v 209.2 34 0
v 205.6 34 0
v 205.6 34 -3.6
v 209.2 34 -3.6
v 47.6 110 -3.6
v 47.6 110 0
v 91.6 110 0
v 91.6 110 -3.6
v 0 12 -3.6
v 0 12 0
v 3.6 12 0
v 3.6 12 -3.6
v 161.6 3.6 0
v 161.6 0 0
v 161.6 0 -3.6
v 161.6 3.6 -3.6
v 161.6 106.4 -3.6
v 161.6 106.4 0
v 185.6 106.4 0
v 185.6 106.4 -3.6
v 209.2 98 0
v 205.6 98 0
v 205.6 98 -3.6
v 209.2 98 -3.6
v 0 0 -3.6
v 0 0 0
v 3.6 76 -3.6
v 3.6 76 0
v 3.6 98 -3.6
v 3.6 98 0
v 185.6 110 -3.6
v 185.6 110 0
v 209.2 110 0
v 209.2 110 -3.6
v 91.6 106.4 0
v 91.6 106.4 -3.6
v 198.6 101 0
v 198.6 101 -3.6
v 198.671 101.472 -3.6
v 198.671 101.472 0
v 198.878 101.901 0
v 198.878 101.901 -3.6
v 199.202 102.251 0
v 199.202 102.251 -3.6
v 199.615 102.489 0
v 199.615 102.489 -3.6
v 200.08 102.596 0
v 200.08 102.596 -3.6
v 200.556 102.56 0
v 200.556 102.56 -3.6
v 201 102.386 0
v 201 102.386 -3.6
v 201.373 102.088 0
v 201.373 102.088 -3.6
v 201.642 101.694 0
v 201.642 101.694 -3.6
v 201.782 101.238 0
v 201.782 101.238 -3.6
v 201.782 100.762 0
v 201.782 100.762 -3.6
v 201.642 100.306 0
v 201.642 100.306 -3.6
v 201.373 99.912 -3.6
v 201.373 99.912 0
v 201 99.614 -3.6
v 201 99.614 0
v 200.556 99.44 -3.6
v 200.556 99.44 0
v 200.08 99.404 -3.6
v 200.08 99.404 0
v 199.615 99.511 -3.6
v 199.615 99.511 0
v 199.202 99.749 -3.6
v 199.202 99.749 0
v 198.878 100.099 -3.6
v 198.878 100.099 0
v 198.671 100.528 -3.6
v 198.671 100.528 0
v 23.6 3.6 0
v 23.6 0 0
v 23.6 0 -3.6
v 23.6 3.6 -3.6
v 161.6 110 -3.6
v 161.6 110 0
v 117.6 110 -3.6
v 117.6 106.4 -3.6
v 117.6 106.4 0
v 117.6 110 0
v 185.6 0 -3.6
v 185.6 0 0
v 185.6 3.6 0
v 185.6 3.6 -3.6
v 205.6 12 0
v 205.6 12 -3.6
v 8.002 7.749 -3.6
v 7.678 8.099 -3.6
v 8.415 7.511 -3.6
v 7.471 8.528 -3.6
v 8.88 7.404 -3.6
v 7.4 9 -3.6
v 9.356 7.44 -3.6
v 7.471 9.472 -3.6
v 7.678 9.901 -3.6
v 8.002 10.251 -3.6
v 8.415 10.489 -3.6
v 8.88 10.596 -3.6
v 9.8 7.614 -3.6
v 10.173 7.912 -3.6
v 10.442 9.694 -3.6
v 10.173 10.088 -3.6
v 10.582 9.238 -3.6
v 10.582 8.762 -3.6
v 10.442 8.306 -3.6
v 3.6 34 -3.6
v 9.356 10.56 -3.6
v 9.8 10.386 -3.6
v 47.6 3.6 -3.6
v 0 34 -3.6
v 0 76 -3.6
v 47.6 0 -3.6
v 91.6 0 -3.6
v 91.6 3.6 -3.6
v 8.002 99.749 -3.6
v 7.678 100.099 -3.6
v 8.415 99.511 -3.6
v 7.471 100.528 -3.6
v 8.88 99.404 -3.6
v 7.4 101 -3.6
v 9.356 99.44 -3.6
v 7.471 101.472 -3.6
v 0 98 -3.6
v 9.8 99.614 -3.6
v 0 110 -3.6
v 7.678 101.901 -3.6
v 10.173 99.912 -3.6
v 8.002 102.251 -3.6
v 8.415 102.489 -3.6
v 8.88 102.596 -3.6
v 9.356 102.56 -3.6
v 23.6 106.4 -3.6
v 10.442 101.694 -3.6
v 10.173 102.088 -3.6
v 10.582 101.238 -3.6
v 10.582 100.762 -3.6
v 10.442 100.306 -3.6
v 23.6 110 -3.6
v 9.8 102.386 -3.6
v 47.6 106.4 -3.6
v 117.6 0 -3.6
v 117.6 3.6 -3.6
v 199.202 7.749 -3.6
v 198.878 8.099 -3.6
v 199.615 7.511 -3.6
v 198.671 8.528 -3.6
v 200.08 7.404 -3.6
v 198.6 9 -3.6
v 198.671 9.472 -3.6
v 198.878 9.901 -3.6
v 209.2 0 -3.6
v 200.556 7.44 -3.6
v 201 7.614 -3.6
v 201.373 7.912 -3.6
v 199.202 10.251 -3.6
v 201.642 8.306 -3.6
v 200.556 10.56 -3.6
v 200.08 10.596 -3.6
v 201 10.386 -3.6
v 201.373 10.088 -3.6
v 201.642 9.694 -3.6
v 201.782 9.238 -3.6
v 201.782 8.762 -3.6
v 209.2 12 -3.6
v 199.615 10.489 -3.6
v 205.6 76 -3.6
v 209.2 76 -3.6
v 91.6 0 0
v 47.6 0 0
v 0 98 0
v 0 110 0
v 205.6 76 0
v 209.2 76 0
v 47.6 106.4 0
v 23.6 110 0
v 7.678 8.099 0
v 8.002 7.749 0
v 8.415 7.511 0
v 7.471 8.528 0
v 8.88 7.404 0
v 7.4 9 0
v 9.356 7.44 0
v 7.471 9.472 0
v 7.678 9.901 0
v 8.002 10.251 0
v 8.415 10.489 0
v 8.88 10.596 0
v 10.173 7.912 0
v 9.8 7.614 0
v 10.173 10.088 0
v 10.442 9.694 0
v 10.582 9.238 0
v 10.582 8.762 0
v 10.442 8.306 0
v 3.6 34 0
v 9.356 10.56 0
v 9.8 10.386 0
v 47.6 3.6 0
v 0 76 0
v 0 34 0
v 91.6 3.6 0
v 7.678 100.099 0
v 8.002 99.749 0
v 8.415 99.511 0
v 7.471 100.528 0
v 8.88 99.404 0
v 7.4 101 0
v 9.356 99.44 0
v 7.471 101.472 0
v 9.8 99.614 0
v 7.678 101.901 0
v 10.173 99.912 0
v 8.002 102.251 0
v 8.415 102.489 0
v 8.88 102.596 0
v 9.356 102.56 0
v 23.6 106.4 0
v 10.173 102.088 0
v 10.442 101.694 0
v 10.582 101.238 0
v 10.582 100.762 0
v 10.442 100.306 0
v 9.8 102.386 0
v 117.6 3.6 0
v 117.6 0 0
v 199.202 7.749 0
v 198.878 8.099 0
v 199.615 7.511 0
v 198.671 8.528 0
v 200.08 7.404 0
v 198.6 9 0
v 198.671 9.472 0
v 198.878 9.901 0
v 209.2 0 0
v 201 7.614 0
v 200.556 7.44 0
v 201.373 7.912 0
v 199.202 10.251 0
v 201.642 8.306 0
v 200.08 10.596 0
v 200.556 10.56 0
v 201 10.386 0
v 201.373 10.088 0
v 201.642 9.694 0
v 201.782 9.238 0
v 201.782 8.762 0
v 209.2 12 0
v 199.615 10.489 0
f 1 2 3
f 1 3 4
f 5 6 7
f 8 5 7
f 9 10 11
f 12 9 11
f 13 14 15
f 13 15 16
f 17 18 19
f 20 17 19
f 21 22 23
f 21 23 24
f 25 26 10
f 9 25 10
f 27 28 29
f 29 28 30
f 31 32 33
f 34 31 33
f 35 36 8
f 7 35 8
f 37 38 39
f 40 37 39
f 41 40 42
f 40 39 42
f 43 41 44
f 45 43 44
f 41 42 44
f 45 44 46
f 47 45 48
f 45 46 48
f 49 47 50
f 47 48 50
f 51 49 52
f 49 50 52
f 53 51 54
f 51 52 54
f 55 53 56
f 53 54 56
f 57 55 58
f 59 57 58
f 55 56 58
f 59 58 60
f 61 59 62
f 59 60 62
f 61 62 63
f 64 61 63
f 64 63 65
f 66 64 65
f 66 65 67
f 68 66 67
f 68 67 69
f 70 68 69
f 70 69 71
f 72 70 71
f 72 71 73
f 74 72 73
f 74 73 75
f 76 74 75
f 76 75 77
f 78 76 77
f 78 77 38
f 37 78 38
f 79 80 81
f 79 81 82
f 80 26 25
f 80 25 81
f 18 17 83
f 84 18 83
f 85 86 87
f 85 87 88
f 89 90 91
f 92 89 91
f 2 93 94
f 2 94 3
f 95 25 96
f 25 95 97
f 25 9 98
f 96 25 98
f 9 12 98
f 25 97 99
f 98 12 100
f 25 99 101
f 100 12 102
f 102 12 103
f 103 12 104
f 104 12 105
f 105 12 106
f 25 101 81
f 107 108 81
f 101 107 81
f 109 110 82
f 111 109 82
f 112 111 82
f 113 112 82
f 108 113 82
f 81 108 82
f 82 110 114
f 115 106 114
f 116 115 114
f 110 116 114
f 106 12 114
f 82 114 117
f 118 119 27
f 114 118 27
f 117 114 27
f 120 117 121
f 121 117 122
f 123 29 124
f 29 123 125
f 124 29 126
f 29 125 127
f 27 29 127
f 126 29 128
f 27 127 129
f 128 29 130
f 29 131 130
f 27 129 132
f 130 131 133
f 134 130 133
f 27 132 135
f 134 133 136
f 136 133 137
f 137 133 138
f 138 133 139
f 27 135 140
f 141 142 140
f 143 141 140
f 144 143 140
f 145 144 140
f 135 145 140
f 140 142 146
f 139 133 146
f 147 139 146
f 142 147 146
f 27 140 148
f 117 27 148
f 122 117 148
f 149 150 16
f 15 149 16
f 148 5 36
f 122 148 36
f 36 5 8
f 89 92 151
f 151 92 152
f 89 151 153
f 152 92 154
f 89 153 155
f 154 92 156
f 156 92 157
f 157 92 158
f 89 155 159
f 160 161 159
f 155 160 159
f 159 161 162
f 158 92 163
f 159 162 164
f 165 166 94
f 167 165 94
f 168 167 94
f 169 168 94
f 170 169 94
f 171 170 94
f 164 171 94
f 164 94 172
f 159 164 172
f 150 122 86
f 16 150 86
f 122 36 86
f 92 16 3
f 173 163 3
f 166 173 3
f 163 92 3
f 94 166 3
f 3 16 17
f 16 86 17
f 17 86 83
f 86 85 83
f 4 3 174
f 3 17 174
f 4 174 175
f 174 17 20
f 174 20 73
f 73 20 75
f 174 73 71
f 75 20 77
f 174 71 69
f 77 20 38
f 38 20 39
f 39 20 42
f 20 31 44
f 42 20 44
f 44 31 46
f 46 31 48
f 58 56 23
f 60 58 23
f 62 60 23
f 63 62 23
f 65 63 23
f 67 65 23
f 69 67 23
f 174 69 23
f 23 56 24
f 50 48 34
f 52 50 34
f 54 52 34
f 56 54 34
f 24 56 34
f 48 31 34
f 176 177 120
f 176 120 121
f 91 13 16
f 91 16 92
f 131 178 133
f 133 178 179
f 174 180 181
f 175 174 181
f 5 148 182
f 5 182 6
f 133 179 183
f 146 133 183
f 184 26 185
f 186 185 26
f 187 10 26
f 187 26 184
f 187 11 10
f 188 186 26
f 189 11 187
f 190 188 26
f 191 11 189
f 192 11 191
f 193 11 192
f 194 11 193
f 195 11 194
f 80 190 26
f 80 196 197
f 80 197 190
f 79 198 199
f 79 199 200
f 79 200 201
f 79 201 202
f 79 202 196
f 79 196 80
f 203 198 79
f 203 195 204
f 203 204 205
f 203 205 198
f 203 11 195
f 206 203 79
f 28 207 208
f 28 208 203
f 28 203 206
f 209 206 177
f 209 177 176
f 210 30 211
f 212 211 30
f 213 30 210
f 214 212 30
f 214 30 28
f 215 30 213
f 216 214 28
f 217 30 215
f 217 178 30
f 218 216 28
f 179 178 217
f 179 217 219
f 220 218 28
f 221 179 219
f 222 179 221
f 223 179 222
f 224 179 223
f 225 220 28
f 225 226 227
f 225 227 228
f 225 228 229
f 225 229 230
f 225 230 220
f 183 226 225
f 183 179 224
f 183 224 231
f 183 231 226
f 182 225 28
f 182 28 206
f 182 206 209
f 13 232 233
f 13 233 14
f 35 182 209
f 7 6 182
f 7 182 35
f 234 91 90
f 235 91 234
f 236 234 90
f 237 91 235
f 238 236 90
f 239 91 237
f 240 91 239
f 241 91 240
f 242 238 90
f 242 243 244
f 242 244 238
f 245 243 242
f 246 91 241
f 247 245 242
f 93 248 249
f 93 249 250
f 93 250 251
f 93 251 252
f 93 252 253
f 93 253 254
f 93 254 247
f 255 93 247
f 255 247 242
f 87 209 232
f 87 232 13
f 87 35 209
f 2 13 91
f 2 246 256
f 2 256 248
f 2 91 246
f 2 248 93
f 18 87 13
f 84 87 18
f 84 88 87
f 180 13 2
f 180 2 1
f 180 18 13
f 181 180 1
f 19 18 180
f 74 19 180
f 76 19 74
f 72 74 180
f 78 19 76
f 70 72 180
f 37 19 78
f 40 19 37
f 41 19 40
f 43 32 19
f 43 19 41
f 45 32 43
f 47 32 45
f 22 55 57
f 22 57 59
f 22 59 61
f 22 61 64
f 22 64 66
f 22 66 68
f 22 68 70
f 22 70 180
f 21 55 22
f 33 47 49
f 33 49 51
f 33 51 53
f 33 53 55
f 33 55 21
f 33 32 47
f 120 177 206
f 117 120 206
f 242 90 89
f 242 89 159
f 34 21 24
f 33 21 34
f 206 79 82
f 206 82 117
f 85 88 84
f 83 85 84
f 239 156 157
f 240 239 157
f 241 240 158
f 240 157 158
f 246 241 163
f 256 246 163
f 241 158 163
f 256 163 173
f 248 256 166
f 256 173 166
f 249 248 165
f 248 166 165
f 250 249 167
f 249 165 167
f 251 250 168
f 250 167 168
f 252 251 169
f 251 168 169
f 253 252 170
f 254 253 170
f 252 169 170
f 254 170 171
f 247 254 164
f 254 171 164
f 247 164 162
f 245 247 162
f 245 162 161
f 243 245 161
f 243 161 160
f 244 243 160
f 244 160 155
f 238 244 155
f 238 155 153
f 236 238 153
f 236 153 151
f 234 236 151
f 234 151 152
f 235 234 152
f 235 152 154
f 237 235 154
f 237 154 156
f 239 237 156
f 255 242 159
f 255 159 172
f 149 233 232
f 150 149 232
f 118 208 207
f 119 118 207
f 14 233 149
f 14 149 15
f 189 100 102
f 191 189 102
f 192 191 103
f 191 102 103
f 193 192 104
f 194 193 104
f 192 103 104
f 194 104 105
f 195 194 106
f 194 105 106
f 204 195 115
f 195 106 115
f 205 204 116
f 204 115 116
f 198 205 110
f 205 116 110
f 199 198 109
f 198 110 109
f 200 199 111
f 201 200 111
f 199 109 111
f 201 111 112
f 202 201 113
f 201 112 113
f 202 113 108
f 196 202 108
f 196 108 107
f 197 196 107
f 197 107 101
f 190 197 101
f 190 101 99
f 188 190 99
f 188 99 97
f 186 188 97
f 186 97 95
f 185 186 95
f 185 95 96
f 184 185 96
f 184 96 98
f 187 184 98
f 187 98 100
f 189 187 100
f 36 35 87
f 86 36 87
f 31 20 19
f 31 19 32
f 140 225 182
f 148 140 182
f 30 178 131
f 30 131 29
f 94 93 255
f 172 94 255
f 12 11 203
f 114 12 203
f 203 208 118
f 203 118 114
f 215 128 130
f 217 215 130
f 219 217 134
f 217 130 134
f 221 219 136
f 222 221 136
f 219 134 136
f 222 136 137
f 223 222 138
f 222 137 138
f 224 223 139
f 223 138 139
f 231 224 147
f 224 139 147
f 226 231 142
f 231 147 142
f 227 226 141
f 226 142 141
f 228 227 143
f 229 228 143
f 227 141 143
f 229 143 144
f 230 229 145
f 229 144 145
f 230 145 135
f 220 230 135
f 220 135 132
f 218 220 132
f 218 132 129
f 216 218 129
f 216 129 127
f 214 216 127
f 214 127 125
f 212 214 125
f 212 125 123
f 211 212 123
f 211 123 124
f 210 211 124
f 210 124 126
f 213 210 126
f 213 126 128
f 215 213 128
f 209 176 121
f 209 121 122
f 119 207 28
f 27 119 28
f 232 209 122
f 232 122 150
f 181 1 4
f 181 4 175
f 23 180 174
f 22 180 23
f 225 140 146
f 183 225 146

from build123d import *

# Parameters (mm, degrees)
SKETCH_1_W             = 209.2
SKETCH_1_H             = 110
SM_BASE_FLANGE_1_DEPTH = 3.6
CUT_EXTRUDE_1_REACH    = 238.384
SKETCH_2_W             = 3.6
SKETCH_2_H             = 22
SKETCH_2_W_2           = 24
SKETCH_2_H_2           = 3.6
SKETCH_2_W_3           = 26
CUT_EXTRUDE_2_REACH    = 238.384
SKETCH_3_R             = 1.6


# Sheet-metal steps are written as plain solids
with BuildPart() as part:
    # Sketch 1 → Базовая кромка1 (new body)
    with BuildSketch(Plane.XY):
        with Locations((104.6, 55)):
            Rectangle(SKETCH_1_W, SKETCH_1_H)
    extrude(amount=-SM_BASE_FLANGE_1_DEPTH)

    # Sketch 2 → Вырез-Вытянуть1 (cut, up to next)
    with BuildSketch(Plane.XY, mode=Mode.PRIVATE) as cut_extrude_1_sk1:
        with Locations((1.8, 23)):
            Rectangle(SKETCH_2_W, SKETCH_2_H)
    cut_extrude_1_tool1 = extrude(cut_extrude_1_sk1.sketch, amount=-CUT_EXTRUDE_1_REACH, mode=Mode.PRIVATE) & part.part
    # Sketch 2 → Вырез-Вытянуть1 (cut, up to next)
    with BuildSketch(Plane.XY, mode=Mode.PRIVATE) as cut_extrude_1_sk2:
        with Locations((35.6, 1.8)):
            Rectangle(SKETCH_2_W_2, SKETCH_2_H_2)
    cut_extrude_1_tool2 = extrude(cut_extrude_1_sk2.sketch, amount=-CUT_EXTRUDE_1_REACH, mode=Mode.PRIVATE) & part.part
    # Sketch 2 → Вырез-Вытянуть1 (cut, up to next)
    with BuildSketch(Plane.XY, mode=Mode.PRIVATE) as cut_extrude_1_sk3:
        with Locations((207.4, 87)):
            Rectangle(SKETCH_2_W, SKETCH_2_H)
    cut_extrude_1_tool3 = extrude(cut_extrude_1_sk3.sketch, amount=-CUT_EXTRUDE_1_REACH, mode=Mode.PRIVATE) & part.part
    # Sketch 2 → Вырез-Вытянуть1 (cut, up to next)
    with BuildSketch(Plane.XY, mode=Mode.PRIVATE) as cut_extrude_1_sk4:
        with Locations((104.6, 1.8)):
            Rectangle(SKETCH_2_W_3, SKETCH_2_H_2)
    cut_extrude_1_tool4 = extrude(cut_extrude_1_sk4.sketch, amount=-CUT_EXTRUDE_1_REACH, mode=Mode.PRIVATE) & part.part
    # Sketch 2 → Вырез-Вытянуть1 (cut, up to next)
    with BuildSketch(Plane.XY, mode=Mode.PRIVATE) as cut_extrude_1_sk5:
        with Locations((173.6, 1.8)):
            Rectangle(SKETCH_2_W_2, SKETCH_2_H_2)
    cut_extrude_1_tool5 = extrude(cut_extrude_1_sk5.sketch, amount=-CUT_EXTRUDE_1_REACH, mode=Mode.PRIVATE) & part.part
    # Sketch 2 → Вырез-Вытянуть1 (cut, up to next)
    with BuildSketch(Plane.XY, mode=Mode.PRIVATE) as cut_extrude_1_sk6:
        with Locations((207.4, 23)):
            Rectangle(SKETCH_2_W, SKETCH_2_H)
    cut_extrude_1_tool6 = extrude(cut_extrude_1_sk6.sketch, amount=-CUT_EXTRUDE_1_REACH, mode=Mode.PRIVATE) & part.part
    # Sketch 2 → Вырез-Вытянуть1 (cut, up to next)
    with BuildSketch(Plane.XY, mode=Mode.PRIVATE) as cut_extrude_1_sk7:
        with Locations((173.6, 108.2)):
            Rectangle(SKETCH_2_W_2, SKETCH_2_H_2)
    cut_extrude_1_tool7 = extrude(cut_extrude_1_sk7.sketch, amount=-CUT_EXTRUDE_1_REACH, mode=Mode.PRIVATE) & part.part
    # Sketch 2 → Вырез-Вытянуть1 (cut, up to next)
    with BuildSketch(Plane.XY, mode=Mode.PRIVATE) as cut_extrude_1_sk8:
        with Locations((104.6, 108.2)):
            Rectangle(SKETCH_2_W_3, SKETCH_2_H_2)
    cut_extrude_1_tool8 = extrude(cut_extrude_1_sk8.sketch, amount=-CUT_EXTRUDE_1_REACH, mode=Mode.PRIVATE) & part.part
    # Sketch 2 → Вырез-Вытянуть1 (cut, up to next)
    with BuildSketch(Plane.XY, mode=Mode.PRIVATE) as cut_extrude_1_sk9:
        with Locations((35.6, 108.2)):
            Rectangle(SKETCH_2_W_2, SKETCH_2_H_2)
    cut_extrude_1_tool9 = extrude(cut_extrude_1_sk9.sketch, amount=-CUT_EXTRUDE_1_REACH, mode=Mode.PRIVATE) & part.part
    # Sketch 2 → Вырез-Вытянуть1 (cut, up to next)
    with BuildSketch(Plane.XY, mode=Mode.PRIVATE) as cut_extrude_1_sk10:
        with Locations((1.8, 87)):
            Rectangle(SKETCH_2_W, SKETCH_2_H)
    cut_extrude_1_tool10 = extrude(cut_extrude_1_sk10.sketch, amount=-CUT_EXTRUDE_1_REACH, mode=Mode.PRIVATE) & part.part
    add(cut_extrude_1_tool1.solids().sort_by_distance((1.8, 23, 0))[0], mode=Mode.SUBTRACT)
    add(cut_extrude_1_tool2.solids().sort_by_distance((35.6, 1.8, 0))[0], mode=Mode.SUBTRACT)
    add(cut_extrude_1_tool3.solids().sort_by_distance((207.4, 87, 0))[0], mode=Mode.SUBTRACT)
    add(cut_extrude_1_tool4.solids().sort_by_distance((104.6, 1.8, 0))[0], mode=Mode.SUBTRACT)
    add(cut_extrude_1_tool5.solids().sort_by_distance((173.6, 1.8, 0))[0], mode=Mode.SUBTRACT)
    add(cut_extrude_1_tool6.solids().sort_by_distance((207.4, 23, 0))[0], mode=Mode.SUBTRACT)
    add(cut_extrude_1_tool7.solids().sort_by_distance((173.6, 108.2, 0))[0], mode=Mode.SUBTRACT)
    add(cut_extrude_1_tool8.solids().sort_by_distance((104.6, 108.2, 0))[0], mode=Mode.SUBTRACT)
    add(cut_extrude_1_tool9.solids().sort_by_distance((35.6, 108.2, 0))[0], mode=Mode.SUBTRACT)
    add(cut_extrude_1_tool10.solids().sort_by_distance((1.8, 87, 0))[0], mode=Mode.SUBTRACT)

    # Эскиз3 → Вырез-Вытянуть2 (cut, up to next)
    with BuildSketch(Plane(origin=(0, 0, -3.6), x_dir=(-1, 0, 0), z_dir=(0, 0, -1)), mode=Mode.PRIVATE) as cut_extrude_2_sk1:
        with Locations((-9, 9)):
            Circle(SKETCH_3_R)
    cut_extrude_2_tool1 = extrude(cut_extrude_2_sk1.sketch, amount=-CUT_EXTRUDE_2_REACH, mode=Mode.PRIVATE) & part.part
    # Эскиз3 → Вырез-Вытянуть2 (cut, up to next)
    with BuildSketch(Plane(origin=(0, 0, -3.6), x_dir=(-1, 0, 0), z_dir=(0, 0, -1)), mode=Mode.PRIVATE) as cut_extrude_2_sk2:
        with Locations((-9, 101)):
            Circle(SKETCH_3_R)
    cut_extrude_2_tool2 = extrude(cut_extrude_2_sk2.sketch, amount=-CUT_EXTRUDE_2_REACH, mode=Mode.PRIVATE) & part.part
    # Эскиз3 → Вырез-Вытянуть2 (cut, up to next)
    with BuildSketch(Plane(origin=(0, 0, -3.6), x_dir=(-1, 0, 0), z_dir=(0, 0, -1)), mode=Mode.PRIVATE) as cut_extrude_2_sk3:
        with Locations((-200.2, 9)):
            Circle(SKETCH_3_R)
    cut_extrude_2_tool3 = extrude(cut_extrude_2_sk3.sketch, amount=-CUT_EXTRUDE_2_REACH, mode=Mode.PRIVATE) & part.part
    # Эскиз3 → Вырез-Вытянуть2 (cut, up to next)
    with BuildSketch(Plane(origin=(0, 0, -3.6), x_dir=(-1, 0, 0), z_dir=(0, 0, -1)), mode=Mode.PRIVATE) as cut_extrude_2_sk4:
        with Locations((-200.2, 101)):
            Circle(SKETCH_3_R)
    cut_extrude_2_tool4 = extrude(cut_extrude_2_sk4.sketch, amount=-CUT_EXTRUDE_2_REACH, mode=Mode.PRIVATE) & part.part
    add(cut_extrude_2_tool1.solids().sort_by_distance((9, 9, -3.6))[0], mode=Mode.SUBTRACT)
    add(cut_extrude_2_tool2.solids().sort_by_distance((9, 101, -3.6))[0], mode=Mode.SUBTRACT)
    add(cut_extrude_2_tool3.solids().sort_by_distance((200.2, 9, -3.6))[0], mode=Mode.SUBTRACT)
    add(cut_extrude_2_tool4.solids().sort_by_distance((200.2, 101, -3.6))[0], mode=Mode.SUBTRACT)


solid = part.part
